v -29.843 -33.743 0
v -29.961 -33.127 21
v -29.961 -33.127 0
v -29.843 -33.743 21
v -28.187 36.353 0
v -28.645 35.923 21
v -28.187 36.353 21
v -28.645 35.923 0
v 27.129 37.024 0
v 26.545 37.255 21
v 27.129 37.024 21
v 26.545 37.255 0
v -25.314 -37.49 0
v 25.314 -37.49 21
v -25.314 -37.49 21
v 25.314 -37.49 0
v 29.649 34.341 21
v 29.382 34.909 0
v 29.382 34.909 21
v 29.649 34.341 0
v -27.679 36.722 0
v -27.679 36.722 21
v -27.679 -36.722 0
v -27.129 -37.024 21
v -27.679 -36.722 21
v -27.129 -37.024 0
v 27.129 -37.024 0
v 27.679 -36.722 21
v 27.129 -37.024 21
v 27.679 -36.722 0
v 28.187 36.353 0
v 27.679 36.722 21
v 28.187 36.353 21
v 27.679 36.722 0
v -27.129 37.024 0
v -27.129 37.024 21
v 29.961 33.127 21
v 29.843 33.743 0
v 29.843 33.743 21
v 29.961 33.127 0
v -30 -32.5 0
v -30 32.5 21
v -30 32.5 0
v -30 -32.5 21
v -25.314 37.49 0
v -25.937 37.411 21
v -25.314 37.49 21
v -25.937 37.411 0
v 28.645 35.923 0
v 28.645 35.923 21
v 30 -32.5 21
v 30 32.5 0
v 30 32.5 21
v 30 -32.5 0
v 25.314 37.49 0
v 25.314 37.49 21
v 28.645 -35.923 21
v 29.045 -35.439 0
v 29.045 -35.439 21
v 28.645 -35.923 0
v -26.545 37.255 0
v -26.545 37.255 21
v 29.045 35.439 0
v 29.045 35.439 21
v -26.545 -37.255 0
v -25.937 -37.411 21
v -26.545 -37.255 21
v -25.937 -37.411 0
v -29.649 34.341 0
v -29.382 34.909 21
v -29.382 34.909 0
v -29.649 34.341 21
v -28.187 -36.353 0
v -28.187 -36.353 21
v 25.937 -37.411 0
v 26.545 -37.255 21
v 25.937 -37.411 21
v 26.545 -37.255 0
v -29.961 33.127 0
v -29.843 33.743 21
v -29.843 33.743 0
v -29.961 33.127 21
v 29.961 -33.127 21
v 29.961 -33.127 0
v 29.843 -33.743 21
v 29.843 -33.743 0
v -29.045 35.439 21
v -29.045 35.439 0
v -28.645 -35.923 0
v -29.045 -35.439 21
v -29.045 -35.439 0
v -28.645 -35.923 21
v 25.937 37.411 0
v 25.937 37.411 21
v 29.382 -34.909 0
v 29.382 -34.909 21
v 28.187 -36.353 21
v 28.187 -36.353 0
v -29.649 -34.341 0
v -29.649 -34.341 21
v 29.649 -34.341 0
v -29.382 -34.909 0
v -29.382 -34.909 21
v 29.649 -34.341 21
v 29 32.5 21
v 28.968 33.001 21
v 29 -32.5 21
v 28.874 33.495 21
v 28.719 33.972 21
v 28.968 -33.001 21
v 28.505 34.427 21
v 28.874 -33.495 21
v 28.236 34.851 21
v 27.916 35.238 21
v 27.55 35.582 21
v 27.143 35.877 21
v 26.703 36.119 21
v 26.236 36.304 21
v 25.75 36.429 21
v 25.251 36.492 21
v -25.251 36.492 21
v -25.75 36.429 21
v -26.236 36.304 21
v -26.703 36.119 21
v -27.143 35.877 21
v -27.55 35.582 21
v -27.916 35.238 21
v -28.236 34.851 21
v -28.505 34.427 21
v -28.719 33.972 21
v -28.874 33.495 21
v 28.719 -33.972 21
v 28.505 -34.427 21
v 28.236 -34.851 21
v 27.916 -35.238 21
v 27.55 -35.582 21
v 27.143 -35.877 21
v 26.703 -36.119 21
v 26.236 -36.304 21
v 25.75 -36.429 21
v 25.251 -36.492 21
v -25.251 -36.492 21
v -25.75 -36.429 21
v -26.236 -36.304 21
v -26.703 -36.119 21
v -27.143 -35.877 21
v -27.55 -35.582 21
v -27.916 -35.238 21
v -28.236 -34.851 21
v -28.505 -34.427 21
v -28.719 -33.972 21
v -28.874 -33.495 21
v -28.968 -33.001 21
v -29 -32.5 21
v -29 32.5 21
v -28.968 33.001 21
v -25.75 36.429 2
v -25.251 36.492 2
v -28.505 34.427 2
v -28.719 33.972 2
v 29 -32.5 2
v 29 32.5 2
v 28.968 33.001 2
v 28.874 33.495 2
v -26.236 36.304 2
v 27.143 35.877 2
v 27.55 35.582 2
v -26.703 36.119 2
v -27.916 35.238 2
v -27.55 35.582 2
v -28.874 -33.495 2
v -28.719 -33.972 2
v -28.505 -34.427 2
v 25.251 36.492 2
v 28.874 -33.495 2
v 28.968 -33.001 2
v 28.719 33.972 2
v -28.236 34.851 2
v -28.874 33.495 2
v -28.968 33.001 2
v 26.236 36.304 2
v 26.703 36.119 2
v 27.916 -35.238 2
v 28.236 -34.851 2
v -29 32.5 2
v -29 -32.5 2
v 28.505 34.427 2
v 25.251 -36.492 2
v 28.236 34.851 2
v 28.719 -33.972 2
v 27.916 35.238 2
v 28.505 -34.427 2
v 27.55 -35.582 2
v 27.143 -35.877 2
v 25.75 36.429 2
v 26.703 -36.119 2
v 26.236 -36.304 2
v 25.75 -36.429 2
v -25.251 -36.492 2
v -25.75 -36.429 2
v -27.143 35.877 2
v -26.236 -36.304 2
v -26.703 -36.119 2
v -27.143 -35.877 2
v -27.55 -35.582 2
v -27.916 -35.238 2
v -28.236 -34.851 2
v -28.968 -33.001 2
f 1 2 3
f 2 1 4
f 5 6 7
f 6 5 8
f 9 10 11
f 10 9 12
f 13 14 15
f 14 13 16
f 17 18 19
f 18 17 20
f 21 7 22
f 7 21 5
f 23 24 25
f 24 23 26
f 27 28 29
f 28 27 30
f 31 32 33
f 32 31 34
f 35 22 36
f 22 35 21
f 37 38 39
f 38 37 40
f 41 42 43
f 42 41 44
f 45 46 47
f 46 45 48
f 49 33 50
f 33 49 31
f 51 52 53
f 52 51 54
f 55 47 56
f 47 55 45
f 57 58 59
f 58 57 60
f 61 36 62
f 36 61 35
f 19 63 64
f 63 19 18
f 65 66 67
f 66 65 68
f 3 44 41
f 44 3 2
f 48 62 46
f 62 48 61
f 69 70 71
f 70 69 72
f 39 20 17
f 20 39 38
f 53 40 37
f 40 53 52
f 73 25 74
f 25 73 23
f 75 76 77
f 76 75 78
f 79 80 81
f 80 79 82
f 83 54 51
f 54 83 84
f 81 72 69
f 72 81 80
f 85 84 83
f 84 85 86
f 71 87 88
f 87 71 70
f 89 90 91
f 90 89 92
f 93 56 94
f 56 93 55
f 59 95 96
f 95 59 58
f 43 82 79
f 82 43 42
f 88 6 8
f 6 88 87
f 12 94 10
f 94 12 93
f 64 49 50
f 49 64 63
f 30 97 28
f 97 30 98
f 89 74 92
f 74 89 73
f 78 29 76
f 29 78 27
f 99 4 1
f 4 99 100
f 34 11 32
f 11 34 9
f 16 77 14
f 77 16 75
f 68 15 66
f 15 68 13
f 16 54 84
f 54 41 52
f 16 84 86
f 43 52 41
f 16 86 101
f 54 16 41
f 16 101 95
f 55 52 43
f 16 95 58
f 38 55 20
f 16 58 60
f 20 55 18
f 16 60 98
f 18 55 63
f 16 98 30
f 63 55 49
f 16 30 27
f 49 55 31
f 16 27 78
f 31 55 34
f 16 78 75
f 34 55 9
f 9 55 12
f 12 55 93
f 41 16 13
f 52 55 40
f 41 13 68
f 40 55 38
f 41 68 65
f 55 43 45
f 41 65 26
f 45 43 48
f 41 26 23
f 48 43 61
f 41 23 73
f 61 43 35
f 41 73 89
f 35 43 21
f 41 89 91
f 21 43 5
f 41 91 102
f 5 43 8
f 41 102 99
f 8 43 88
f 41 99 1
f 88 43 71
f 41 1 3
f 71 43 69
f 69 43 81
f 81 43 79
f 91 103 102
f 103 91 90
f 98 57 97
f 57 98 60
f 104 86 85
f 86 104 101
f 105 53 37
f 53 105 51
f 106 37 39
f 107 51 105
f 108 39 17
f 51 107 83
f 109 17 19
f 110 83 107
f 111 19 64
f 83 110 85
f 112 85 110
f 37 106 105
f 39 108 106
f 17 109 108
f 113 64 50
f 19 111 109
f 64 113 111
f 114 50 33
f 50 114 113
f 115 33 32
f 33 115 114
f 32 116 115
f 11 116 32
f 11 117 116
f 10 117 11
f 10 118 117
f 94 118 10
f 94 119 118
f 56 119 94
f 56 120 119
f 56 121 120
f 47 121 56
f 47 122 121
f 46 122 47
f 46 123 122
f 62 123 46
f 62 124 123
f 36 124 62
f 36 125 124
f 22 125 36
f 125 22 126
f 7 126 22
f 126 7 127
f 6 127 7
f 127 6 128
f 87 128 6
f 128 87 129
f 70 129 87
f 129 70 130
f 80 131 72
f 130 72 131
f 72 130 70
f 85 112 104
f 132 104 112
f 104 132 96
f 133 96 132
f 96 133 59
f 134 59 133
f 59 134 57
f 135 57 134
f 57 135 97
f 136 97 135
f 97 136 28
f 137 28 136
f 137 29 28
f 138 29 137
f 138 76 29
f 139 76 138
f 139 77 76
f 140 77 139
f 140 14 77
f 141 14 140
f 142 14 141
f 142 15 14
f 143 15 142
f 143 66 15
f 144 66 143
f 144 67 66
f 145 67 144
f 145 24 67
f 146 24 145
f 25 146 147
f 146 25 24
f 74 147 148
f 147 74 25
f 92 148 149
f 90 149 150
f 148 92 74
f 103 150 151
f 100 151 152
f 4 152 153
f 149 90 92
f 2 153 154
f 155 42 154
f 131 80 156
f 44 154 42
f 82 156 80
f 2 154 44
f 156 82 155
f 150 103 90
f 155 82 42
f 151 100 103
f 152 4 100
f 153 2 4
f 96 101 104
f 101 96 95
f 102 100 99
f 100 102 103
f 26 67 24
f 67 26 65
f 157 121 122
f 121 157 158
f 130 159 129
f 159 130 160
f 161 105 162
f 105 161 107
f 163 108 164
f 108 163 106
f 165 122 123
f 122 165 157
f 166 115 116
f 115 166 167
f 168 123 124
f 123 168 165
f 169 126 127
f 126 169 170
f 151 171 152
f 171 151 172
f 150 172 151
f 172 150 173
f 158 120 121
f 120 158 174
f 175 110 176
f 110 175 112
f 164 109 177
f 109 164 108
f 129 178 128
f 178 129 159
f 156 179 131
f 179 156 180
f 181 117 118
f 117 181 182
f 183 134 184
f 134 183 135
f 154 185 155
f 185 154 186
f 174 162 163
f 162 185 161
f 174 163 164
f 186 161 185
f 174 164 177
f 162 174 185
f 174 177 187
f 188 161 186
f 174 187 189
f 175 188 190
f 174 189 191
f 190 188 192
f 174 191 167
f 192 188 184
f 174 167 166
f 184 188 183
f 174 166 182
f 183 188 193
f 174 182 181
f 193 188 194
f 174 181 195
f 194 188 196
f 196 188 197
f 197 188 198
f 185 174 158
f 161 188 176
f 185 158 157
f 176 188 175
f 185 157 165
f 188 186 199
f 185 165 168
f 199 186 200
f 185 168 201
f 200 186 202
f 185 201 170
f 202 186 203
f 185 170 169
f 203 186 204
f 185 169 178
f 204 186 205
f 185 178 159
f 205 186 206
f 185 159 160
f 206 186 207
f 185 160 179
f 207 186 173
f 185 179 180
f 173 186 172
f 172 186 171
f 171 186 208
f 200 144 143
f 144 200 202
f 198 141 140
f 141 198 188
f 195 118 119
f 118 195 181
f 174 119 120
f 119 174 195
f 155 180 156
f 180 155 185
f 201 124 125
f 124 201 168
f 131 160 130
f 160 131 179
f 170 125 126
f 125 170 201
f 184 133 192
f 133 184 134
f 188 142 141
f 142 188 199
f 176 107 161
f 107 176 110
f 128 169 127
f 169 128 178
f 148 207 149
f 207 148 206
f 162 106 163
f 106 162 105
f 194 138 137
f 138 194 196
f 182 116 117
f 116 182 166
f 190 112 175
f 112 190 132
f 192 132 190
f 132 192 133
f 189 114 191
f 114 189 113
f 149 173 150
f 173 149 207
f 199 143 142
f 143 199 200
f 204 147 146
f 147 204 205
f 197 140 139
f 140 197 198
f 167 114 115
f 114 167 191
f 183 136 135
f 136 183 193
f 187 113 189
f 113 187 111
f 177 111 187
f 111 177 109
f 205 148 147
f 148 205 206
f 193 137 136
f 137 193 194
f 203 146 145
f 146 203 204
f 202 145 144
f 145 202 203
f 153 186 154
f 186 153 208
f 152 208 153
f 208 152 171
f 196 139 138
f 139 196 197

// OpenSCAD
$fn = 50;


difference() {
	union() {
		hull() {
			translate(v = [-25.0000000000, 32.5000000000, 0]) {
				cylinder(h = 21, r = 5);
			}
			translate(v = [25.0000000000, 32.5000000000, 0]) {
				cylinder(h = 21, r = 5);
			}
			translate(v = [-25.0000000000, -32.5000000000, 0]) {
				cylinder(h = 21, r = 5);
			}
			translate(v = [25.0000000000, -32.5000000000, 0]) {
				cylinder(h = 21, r = 5);
			}
		}
	}
	union() {
		translate(v = [0, 0, 2]) {
			hull() {
				translate(v = [-25.0000000000, 32.5000000000, 0]) {
					cylinder(h = 19, r = 4);
				}
				translate(v = [25.0000000000, 32.5000000000, 0]) {
					cylinder(h = 19, r = 4);
				}
				translate(v = [-25.0000000000, -32.5000000000, 0]) {
					cylinder(h = 19, r = 4);
				}
				translate(v = [25.0000000000, -32.5000000000, 0]) {
					cylinder(h = 19, r = 4);
				}
			}
		}
	}
}
